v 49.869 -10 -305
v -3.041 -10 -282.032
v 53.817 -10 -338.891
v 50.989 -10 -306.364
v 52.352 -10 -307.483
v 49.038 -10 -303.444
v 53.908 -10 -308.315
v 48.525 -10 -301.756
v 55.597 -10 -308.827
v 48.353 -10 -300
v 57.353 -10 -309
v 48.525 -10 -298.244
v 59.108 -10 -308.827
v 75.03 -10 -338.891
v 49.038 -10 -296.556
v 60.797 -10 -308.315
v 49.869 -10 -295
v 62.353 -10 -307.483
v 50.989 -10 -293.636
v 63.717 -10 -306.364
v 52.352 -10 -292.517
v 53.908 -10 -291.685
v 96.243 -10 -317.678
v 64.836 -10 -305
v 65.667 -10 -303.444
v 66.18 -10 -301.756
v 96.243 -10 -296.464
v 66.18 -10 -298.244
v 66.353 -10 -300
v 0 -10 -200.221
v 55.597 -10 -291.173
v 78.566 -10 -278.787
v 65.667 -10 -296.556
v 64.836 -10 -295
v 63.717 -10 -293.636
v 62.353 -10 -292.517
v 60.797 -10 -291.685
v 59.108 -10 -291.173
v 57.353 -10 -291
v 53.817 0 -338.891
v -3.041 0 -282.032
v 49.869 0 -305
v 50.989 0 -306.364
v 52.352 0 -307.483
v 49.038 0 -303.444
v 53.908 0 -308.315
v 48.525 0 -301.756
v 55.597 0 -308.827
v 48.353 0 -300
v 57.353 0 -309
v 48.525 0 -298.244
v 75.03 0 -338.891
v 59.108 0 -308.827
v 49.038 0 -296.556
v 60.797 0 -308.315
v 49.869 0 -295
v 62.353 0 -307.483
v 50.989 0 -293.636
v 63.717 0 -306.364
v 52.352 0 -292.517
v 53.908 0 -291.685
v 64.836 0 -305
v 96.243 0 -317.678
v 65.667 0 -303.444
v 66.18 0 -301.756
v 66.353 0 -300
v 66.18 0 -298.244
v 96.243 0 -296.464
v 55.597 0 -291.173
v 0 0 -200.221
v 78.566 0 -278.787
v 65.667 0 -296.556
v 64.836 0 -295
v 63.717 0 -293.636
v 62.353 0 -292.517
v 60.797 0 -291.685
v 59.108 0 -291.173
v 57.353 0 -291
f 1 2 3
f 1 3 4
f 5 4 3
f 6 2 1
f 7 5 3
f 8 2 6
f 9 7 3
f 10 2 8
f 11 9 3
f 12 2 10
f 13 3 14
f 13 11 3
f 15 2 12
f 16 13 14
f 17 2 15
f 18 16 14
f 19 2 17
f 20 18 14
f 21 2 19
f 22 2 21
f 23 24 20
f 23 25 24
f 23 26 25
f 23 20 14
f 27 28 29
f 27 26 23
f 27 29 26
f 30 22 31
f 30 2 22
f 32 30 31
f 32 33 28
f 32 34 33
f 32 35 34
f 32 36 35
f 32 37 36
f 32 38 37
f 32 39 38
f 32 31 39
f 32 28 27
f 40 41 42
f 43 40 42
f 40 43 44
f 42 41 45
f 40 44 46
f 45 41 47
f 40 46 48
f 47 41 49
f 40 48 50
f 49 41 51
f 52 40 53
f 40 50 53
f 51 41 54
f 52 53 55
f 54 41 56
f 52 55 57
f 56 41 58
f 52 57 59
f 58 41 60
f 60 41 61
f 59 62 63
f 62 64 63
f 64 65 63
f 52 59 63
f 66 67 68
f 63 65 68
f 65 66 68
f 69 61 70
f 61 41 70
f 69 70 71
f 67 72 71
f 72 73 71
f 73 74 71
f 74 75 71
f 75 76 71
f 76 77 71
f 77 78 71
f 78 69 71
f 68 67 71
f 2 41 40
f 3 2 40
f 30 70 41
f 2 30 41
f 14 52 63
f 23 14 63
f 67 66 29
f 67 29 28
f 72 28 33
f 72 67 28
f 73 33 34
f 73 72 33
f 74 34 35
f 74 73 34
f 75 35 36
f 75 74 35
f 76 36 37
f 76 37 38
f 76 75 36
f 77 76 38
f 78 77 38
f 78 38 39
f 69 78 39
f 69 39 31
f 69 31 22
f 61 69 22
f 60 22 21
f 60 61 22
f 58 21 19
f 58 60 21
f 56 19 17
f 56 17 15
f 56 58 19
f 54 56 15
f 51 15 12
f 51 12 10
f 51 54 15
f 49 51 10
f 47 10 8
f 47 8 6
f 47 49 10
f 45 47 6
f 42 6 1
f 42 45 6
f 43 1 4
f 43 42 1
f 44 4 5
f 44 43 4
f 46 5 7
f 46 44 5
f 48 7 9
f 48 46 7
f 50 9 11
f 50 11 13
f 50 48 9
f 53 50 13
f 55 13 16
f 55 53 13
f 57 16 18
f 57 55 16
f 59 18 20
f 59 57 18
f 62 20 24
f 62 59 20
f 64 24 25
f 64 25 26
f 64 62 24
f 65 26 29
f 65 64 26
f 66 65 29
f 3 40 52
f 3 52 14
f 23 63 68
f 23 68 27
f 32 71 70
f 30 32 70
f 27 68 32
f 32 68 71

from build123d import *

# Parameters (mm, degrees)
F0_R     = 9
F1_DEPTH = 10
F2_SIZE  = 15


with BuildPart() as f1:
    # F0 (on Front) → F1 (new body)
    with BuildSketch(Plane.XZ):
        Polygon((106.8500287361, -307.0710678119), (78.5657574887, -278.7867965644), (0, -200.2210390757), (-3.0413549592, -282.0324978589), (64.4236218649, -349.4974746831), align=None)
        with Locations((57.3525540531, -300)):
            Circle(F0_R, mode=Mode.SUBTRACT)
    extrude(amount=F1_DEPTH)

    # F2
    f2_edges = [f1.edges().sort_by_distance(p)[0] for p in [
        (106.850029, -5, -307.071068),
        (64.423622, -5, -349.497475),
    ]]
    chamfer(f2_edges, length=F2_SIZE)


solid = f1.part
